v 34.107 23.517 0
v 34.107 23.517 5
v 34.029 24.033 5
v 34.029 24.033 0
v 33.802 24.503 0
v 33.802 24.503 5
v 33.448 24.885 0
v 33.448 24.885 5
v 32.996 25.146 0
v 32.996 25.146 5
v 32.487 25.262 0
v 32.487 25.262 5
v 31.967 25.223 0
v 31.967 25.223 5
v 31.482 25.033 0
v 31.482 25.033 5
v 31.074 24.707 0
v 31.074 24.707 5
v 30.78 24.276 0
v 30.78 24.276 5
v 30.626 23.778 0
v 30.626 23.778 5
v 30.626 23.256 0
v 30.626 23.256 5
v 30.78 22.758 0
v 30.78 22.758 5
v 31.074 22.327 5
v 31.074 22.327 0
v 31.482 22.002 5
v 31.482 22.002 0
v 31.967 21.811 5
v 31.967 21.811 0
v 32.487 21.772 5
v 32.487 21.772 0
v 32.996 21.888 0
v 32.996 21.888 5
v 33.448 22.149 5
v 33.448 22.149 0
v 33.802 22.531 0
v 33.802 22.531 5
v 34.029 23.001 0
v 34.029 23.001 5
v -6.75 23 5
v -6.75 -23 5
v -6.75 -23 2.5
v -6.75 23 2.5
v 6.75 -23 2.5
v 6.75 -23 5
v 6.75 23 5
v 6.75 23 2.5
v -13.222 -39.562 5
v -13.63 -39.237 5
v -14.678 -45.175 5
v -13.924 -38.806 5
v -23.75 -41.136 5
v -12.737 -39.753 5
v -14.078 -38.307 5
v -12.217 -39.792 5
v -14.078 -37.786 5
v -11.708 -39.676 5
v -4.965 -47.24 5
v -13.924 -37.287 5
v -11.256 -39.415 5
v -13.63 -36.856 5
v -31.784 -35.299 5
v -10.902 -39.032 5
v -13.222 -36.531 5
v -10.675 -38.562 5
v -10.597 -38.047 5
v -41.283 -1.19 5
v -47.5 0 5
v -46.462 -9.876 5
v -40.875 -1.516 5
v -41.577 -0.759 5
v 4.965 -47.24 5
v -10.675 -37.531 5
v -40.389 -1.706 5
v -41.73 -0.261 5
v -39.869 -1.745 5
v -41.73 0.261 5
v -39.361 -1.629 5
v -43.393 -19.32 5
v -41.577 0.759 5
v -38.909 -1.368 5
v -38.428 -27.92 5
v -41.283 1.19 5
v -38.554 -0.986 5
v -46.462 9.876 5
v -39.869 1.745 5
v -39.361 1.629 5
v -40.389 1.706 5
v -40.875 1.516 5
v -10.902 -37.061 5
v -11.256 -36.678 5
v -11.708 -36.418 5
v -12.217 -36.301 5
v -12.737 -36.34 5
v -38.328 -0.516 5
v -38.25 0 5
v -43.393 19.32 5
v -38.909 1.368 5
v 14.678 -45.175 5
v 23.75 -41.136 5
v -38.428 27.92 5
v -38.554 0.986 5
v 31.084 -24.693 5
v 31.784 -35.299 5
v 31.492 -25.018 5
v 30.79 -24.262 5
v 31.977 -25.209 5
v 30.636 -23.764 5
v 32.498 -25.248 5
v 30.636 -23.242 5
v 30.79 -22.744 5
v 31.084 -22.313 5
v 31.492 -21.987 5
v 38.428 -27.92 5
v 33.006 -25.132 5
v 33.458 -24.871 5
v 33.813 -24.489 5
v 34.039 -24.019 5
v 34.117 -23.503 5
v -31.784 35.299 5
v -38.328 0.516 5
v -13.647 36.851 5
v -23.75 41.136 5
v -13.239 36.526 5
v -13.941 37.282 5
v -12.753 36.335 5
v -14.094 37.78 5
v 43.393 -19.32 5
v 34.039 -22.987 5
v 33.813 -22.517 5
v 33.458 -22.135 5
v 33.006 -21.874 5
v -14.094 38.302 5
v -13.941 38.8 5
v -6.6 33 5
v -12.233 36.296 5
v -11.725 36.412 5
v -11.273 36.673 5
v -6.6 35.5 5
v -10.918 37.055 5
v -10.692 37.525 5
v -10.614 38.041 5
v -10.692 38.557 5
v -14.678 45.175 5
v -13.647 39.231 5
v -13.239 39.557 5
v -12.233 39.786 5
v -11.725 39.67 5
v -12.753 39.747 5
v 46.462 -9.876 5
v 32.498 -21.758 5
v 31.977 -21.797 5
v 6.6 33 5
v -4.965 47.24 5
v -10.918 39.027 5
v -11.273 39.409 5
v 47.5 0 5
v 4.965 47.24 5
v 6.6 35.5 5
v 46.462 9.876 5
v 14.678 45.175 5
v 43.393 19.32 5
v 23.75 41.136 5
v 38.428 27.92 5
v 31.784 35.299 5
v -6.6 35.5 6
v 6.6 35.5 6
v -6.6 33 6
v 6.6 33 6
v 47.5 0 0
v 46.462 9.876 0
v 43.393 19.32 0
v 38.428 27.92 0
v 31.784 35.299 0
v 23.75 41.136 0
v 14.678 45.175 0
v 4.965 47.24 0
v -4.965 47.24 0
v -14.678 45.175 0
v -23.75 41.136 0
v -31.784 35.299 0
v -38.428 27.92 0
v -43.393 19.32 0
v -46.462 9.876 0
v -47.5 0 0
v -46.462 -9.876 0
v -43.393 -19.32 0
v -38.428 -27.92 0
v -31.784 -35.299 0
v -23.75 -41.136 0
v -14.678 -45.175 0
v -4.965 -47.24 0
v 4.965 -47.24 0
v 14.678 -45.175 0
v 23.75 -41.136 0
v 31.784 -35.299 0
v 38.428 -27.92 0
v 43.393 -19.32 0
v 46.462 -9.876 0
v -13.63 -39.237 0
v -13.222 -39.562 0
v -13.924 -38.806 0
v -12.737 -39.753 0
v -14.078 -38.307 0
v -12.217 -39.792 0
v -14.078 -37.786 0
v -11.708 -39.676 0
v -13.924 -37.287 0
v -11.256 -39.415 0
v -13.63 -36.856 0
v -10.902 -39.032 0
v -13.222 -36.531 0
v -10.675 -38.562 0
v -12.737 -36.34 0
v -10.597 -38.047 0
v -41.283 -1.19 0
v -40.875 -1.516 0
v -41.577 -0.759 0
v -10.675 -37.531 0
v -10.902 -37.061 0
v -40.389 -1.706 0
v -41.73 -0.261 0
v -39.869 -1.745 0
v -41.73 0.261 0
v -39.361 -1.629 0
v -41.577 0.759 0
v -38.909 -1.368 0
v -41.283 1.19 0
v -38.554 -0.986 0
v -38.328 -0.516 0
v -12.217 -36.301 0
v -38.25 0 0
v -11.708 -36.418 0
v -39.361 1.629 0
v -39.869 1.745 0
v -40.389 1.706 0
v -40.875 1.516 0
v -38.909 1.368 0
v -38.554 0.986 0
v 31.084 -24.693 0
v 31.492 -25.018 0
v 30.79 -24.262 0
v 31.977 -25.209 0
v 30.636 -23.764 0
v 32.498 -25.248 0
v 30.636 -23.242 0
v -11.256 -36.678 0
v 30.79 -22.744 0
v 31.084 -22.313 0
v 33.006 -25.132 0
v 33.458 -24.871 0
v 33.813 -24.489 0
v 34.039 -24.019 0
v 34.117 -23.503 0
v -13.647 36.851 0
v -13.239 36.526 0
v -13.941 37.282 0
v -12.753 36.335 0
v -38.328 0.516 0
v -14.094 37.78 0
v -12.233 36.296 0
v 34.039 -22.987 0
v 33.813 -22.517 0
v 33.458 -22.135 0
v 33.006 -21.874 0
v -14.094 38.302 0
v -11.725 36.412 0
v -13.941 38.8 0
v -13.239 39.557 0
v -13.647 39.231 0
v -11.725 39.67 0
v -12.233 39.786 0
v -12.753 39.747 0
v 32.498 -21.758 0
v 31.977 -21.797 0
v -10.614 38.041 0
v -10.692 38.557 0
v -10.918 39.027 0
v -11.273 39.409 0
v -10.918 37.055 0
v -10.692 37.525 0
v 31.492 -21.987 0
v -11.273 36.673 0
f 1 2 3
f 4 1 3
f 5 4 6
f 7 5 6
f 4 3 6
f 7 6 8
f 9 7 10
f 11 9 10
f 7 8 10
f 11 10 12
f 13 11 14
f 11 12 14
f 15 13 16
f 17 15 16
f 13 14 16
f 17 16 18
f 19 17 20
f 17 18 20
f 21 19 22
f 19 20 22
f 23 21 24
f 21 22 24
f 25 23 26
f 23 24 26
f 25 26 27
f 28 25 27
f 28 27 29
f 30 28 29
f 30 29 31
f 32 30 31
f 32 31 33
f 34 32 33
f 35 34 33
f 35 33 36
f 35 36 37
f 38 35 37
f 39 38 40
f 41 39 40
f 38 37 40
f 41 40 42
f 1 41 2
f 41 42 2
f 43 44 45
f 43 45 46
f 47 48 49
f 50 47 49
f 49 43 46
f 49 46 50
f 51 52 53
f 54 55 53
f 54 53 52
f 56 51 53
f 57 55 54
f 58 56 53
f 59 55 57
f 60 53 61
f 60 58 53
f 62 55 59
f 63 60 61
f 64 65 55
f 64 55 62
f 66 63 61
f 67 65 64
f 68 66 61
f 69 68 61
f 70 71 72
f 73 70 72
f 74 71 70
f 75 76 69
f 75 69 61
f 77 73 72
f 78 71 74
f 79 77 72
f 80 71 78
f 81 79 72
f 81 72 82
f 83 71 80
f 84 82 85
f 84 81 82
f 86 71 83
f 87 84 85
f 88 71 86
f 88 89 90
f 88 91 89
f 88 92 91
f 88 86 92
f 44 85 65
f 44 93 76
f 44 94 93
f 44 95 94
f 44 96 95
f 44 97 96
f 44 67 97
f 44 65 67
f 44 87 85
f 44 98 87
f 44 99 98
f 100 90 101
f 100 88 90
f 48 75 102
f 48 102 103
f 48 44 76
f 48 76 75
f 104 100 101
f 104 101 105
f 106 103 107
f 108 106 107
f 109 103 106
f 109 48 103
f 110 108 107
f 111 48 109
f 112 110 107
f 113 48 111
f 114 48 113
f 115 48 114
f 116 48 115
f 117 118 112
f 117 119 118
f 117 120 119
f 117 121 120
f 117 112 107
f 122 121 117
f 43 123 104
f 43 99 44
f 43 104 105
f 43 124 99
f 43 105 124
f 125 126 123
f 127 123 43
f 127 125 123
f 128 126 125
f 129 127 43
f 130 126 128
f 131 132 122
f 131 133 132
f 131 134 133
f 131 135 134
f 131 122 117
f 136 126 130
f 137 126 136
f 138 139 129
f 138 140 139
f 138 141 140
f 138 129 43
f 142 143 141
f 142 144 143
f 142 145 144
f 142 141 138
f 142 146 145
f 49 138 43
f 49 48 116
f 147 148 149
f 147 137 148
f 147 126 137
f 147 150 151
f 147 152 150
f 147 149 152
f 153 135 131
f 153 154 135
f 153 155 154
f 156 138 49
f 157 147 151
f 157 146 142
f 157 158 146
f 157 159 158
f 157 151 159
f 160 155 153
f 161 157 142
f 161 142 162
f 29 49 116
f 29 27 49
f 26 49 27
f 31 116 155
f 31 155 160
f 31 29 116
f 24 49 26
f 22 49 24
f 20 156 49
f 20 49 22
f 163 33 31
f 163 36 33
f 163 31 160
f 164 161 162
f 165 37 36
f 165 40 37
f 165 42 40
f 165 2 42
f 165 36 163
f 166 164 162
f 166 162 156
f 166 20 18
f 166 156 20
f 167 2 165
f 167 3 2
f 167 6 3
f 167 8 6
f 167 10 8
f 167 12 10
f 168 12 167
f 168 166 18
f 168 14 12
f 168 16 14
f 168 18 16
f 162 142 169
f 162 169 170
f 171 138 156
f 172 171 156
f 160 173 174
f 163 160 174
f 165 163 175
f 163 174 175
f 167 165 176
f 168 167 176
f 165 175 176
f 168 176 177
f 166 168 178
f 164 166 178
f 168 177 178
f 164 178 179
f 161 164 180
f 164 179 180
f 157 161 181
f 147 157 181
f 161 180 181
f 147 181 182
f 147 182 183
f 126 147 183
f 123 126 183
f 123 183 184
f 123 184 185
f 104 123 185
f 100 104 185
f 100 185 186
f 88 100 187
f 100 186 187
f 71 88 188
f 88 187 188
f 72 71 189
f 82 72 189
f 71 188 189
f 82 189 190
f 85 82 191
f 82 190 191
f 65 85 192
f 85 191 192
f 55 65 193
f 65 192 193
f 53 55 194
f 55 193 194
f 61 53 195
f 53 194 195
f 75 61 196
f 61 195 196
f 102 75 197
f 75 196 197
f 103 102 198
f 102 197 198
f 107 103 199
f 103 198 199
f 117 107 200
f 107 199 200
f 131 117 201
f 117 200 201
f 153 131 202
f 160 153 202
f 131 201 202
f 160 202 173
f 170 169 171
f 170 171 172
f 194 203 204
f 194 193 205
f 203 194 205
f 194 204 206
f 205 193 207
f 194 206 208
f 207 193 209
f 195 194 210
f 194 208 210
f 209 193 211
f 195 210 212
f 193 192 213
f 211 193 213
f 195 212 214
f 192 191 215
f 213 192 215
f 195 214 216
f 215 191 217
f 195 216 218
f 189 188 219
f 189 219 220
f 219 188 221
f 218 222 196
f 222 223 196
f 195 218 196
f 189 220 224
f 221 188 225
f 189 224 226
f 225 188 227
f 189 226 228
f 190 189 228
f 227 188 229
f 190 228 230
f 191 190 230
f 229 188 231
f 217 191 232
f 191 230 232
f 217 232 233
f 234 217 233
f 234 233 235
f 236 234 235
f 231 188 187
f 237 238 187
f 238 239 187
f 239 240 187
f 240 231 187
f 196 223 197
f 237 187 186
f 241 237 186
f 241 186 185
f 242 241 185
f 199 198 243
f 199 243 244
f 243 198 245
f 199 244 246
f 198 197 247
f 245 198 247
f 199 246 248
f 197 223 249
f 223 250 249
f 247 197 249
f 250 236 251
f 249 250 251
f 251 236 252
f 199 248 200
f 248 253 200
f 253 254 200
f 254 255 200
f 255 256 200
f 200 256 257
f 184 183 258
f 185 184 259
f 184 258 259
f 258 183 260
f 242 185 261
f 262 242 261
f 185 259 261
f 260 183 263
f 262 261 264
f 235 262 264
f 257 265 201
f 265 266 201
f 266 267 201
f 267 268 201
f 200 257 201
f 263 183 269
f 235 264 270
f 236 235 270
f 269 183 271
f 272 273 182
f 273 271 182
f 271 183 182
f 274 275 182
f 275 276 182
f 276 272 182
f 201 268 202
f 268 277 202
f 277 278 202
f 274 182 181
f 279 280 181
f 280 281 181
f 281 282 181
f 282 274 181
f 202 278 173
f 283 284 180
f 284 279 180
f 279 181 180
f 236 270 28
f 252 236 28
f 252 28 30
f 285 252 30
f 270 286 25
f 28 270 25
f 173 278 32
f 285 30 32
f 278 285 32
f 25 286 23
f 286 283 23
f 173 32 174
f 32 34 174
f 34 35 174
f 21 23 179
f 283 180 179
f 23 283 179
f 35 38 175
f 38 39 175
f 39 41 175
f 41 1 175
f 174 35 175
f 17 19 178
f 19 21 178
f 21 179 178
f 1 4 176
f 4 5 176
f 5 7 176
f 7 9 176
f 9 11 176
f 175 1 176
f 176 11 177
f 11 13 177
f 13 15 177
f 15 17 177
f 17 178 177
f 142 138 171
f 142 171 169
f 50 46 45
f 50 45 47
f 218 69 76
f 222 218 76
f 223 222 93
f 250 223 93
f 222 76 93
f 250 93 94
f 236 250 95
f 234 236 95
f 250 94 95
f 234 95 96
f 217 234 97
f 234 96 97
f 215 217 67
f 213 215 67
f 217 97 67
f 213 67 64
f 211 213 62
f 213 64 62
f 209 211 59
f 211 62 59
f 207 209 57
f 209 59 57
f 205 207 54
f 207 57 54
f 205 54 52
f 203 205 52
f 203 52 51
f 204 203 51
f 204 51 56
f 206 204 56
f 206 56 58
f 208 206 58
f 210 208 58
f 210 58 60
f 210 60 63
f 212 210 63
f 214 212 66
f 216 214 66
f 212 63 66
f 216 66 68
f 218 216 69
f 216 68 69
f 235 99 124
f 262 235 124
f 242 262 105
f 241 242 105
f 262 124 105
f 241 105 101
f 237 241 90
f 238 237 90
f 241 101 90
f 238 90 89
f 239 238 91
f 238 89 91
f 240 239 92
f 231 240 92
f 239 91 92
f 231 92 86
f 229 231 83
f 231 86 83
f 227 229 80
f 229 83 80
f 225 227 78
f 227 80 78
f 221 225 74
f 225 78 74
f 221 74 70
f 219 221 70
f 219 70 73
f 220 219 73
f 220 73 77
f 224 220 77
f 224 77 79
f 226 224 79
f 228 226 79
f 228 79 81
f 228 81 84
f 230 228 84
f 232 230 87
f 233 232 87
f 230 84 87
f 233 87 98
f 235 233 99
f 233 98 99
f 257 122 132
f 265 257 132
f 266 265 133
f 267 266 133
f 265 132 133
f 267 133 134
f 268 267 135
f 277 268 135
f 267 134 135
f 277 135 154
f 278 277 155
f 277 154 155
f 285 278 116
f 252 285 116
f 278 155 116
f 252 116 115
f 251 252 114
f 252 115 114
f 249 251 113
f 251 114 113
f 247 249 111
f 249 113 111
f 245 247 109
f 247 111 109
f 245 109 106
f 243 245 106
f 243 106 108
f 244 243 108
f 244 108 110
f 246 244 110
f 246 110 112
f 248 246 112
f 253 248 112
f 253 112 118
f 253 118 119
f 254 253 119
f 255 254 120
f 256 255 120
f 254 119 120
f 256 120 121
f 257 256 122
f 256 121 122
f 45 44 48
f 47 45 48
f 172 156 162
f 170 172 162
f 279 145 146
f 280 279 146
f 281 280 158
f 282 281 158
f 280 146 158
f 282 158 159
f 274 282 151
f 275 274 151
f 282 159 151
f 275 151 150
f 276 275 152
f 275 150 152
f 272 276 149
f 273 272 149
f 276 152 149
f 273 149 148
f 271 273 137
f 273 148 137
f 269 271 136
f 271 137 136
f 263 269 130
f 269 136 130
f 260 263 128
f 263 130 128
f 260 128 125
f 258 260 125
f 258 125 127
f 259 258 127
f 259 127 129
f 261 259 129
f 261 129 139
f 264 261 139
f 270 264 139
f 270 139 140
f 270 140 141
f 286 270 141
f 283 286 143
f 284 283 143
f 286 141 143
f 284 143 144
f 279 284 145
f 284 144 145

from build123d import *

# Parameters (mm, degrees)
SKETCH024_R     = 47.5
PAD007_DEPTH    = 5
SKETCH025_W     = 13.5
SKETCH025_H     = 46
POCKET014_DEPTH = 2.5
SKETCH026_R     = 1.75
POCKET015_DEPTH = 5
SKETCH023_W     = 13.2
SKETCH023_H     = 2.5
PAD008_DEPTH    = 1


with BuildPart() as part:
    # Sketch024 → Pad007 (new body)
    with BuildSketch(Plane.XY):
        Circle(SKETCH024_R)
    extrude(amount=PAD007_DEPTH)

    # Sketch025 (on Face3 of Pad007) → Pocket014 (cut)
    with BuildSketch(Plane.XY.offset(5)):
        Rectangle(SKETCH025_W, SKETCH025_H)
    extrude(amount=-POCKET014_DEPTH, mode=Mode.SUBTRACT)

    # Sketch026 (on Face3 of Pocket014) → Pocket015 (cut)
    with BuildSketch(Plane.XY.offset(5)):
        with Locations((-40, 0)):
            Circle(SKETCH026_R)
        with Locations((-12.363995, 38.041183)):
            Circle(SKETCH026_R)
        with Locations((32.356581, 23.51705)):
            Circle(SKETCH026_R)
        with Locations((32.366826, -23.502949)):
            Circle(SKETCH026_R)
        with Locations((-12.347418, -38.046567)):
            Circle(SKETCH026_R)
    extrude(amount=-POCKET015_DEPTH, mode=Mode.SUBTRACT)

    # Sketch023 (on Face3 of Pocket015) → Pad008 (join)
    with BuildSketch(Plane.XY.offset(5)):
        with Locations((0, 34.25)):
            Rectangle(SKETCH023_W, SKETCH023_H)
    extrude(amount=PAD008_DEPTH)


solid = part.part
